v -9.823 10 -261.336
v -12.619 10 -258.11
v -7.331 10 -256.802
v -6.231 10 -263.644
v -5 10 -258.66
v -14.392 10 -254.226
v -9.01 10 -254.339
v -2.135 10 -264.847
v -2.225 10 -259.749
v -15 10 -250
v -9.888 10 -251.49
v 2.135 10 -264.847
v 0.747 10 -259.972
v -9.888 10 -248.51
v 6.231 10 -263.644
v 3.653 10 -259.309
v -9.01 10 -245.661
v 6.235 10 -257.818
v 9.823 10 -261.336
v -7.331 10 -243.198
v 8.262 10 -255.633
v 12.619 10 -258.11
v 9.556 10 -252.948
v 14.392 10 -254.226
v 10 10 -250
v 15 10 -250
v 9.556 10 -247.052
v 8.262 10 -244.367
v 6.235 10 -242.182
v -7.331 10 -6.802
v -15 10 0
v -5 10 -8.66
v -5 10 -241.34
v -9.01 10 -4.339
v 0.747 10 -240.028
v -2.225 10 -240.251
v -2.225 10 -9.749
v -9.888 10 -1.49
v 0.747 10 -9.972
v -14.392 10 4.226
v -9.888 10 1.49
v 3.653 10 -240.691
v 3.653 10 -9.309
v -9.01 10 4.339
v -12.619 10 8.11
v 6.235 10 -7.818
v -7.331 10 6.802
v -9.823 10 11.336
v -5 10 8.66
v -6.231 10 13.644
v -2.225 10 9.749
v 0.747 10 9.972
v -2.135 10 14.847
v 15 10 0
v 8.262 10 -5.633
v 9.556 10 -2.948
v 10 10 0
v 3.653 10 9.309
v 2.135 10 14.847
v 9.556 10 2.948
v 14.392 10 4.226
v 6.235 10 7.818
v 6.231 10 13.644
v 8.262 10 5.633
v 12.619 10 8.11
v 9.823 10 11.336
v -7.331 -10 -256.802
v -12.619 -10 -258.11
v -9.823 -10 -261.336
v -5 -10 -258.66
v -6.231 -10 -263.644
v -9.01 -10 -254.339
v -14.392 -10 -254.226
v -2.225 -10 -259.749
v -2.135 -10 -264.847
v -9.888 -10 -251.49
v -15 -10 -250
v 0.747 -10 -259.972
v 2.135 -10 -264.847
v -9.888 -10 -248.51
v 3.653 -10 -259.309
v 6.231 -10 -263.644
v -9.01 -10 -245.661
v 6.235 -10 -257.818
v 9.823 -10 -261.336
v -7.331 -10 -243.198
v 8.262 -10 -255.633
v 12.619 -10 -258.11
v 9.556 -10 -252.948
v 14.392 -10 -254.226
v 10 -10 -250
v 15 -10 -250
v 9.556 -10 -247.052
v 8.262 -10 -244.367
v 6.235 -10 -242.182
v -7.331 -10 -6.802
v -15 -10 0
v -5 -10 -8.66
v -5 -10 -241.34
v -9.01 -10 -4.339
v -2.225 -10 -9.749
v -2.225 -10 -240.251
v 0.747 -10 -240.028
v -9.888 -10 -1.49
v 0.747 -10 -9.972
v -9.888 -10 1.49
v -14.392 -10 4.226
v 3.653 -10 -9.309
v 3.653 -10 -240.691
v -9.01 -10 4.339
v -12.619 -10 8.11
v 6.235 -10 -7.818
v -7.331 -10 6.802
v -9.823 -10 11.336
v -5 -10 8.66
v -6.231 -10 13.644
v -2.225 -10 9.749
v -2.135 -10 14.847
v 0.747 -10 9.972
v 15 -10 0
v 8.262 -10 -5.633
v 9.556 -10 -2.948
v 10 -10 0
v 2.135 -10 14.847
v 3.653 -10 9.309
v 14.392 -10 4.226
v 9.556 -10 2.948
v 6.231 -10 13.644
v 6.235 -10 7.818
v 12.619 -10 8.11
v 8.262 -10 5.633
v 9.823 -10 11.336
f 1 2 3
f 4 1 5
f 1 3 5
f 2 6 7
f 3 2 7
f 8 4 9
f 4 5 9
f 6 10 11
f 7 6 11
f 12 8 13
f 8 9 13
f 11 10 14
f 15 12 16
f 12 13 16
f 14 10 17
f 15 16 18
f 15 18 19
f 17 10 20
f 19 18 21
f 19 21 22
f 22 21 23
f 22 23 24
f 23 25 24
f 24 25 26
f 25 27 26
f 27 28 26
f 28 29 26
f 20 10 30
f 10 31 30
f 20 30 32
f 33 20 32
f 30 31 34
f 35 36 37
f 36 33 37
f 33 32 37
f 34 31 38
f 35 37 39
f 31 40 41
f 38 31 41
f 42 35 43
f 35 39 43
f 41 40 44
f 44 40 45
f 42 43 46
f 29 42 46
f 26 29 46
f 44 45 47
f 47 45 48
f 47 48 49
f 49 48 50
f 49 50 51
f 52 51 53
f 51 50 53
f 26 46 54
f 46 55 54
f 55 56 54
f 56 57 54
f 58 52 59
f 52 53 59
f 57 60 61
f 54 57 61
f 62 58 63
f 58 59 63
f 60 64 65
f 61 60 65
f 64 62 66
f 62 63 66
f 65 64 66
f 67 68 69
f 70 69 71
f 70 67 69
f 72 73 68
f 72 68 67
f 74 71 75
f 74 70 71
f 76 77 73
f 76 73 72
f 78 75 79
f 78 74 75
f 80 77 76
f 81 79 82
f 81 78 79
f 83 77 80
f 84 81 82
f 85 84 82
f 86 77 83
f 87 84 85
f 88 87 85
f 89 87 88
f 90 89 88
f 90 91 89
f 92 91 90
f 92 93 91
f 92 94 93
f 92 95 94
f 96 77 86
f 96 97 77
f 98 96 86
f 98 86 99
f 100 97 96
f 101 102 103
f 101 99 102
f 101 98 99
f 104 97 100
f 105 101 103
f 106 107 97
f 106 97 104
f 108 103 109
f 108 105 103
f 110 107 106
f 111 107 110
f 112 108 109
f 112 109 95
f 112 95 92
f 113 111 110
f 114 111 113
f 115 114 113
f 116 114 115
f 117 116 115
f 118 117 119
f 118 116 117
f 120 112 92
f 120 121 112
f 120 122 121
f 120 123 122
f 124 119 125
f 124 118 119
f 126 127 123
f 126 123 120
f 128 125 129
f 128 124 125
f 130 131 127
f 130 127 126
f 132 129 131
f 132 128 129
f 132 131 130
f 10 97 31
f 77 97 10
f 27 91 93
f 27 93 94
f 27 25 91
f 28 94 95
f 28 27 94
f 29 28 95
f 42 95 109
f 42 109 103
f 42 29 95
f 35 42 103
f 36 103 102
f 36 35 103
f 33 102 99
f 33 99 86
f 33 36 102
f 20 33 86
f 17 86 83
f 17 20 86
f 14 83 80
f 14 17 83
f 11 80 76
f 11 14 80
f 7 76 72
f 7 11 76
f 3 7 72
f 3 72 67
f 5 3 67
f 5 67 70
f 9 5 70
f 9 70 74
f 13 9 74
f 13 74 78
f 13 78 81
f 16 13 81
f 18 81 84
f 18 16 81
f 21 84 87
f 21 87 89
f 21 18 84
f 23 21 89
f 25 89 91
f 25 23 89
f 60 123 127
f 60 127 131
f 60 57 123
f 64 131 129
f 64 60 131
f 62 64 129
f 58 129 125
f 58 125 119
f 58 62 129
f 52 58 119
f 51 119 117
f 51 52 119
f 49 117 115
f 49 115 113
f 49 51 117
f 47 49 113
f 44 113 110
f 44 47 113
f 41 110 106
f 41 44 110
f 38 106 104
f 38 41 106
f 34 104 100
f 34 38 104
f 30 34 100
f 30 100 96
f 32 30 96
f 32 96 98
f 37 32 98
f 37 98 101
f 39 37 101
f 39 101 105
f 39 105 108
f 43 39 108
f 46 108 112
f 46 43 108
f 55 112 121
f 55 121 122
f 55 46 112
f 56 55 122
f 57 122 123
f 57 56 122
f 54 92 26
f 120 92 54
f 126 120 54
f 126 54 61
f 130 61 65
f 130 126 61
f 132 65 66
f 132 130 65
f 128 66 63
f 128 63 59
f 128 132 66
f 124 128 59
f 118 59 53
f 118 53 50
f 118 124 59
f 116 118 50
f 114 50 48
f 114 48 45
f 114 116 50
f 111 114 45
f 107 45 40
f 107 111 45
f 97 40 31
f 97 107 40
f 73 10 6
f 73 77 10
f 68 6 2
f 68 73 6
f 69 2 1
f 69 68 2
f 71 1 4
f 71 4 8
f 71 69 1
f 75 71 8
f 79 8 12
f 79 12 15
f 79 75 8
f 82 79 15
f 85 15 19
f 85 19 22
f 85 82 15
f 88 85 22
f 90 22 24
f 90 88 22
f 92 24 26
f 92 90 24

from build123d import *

# Parameters (mm, degrees)
F0_R     = 10
F1_DEPTH = 10


with BuildPart() as f1:
    # F0 (on Front) → F1 (new body, symmetric)
    with BuildSketch(Plane.XZ):
        with BuildLine():
            Line((15, -250), (15, 0))
            ThreePointArc((15, 0), (0, 15), (-15, 0))
            Line((-15, 0), (-15, -250))
            ThreePointArc((-15, -250), (0, -265), (15, -250))
        make_face()
        with Locations((0, -250)):
            Circle(F0_R, mode=Mode.SUBTRACT)
        Circle(F0_R, mode=Mode.SUBTRACT)
    extrude(amount=F1_DEPTH, both=True)


solid = f1.part
